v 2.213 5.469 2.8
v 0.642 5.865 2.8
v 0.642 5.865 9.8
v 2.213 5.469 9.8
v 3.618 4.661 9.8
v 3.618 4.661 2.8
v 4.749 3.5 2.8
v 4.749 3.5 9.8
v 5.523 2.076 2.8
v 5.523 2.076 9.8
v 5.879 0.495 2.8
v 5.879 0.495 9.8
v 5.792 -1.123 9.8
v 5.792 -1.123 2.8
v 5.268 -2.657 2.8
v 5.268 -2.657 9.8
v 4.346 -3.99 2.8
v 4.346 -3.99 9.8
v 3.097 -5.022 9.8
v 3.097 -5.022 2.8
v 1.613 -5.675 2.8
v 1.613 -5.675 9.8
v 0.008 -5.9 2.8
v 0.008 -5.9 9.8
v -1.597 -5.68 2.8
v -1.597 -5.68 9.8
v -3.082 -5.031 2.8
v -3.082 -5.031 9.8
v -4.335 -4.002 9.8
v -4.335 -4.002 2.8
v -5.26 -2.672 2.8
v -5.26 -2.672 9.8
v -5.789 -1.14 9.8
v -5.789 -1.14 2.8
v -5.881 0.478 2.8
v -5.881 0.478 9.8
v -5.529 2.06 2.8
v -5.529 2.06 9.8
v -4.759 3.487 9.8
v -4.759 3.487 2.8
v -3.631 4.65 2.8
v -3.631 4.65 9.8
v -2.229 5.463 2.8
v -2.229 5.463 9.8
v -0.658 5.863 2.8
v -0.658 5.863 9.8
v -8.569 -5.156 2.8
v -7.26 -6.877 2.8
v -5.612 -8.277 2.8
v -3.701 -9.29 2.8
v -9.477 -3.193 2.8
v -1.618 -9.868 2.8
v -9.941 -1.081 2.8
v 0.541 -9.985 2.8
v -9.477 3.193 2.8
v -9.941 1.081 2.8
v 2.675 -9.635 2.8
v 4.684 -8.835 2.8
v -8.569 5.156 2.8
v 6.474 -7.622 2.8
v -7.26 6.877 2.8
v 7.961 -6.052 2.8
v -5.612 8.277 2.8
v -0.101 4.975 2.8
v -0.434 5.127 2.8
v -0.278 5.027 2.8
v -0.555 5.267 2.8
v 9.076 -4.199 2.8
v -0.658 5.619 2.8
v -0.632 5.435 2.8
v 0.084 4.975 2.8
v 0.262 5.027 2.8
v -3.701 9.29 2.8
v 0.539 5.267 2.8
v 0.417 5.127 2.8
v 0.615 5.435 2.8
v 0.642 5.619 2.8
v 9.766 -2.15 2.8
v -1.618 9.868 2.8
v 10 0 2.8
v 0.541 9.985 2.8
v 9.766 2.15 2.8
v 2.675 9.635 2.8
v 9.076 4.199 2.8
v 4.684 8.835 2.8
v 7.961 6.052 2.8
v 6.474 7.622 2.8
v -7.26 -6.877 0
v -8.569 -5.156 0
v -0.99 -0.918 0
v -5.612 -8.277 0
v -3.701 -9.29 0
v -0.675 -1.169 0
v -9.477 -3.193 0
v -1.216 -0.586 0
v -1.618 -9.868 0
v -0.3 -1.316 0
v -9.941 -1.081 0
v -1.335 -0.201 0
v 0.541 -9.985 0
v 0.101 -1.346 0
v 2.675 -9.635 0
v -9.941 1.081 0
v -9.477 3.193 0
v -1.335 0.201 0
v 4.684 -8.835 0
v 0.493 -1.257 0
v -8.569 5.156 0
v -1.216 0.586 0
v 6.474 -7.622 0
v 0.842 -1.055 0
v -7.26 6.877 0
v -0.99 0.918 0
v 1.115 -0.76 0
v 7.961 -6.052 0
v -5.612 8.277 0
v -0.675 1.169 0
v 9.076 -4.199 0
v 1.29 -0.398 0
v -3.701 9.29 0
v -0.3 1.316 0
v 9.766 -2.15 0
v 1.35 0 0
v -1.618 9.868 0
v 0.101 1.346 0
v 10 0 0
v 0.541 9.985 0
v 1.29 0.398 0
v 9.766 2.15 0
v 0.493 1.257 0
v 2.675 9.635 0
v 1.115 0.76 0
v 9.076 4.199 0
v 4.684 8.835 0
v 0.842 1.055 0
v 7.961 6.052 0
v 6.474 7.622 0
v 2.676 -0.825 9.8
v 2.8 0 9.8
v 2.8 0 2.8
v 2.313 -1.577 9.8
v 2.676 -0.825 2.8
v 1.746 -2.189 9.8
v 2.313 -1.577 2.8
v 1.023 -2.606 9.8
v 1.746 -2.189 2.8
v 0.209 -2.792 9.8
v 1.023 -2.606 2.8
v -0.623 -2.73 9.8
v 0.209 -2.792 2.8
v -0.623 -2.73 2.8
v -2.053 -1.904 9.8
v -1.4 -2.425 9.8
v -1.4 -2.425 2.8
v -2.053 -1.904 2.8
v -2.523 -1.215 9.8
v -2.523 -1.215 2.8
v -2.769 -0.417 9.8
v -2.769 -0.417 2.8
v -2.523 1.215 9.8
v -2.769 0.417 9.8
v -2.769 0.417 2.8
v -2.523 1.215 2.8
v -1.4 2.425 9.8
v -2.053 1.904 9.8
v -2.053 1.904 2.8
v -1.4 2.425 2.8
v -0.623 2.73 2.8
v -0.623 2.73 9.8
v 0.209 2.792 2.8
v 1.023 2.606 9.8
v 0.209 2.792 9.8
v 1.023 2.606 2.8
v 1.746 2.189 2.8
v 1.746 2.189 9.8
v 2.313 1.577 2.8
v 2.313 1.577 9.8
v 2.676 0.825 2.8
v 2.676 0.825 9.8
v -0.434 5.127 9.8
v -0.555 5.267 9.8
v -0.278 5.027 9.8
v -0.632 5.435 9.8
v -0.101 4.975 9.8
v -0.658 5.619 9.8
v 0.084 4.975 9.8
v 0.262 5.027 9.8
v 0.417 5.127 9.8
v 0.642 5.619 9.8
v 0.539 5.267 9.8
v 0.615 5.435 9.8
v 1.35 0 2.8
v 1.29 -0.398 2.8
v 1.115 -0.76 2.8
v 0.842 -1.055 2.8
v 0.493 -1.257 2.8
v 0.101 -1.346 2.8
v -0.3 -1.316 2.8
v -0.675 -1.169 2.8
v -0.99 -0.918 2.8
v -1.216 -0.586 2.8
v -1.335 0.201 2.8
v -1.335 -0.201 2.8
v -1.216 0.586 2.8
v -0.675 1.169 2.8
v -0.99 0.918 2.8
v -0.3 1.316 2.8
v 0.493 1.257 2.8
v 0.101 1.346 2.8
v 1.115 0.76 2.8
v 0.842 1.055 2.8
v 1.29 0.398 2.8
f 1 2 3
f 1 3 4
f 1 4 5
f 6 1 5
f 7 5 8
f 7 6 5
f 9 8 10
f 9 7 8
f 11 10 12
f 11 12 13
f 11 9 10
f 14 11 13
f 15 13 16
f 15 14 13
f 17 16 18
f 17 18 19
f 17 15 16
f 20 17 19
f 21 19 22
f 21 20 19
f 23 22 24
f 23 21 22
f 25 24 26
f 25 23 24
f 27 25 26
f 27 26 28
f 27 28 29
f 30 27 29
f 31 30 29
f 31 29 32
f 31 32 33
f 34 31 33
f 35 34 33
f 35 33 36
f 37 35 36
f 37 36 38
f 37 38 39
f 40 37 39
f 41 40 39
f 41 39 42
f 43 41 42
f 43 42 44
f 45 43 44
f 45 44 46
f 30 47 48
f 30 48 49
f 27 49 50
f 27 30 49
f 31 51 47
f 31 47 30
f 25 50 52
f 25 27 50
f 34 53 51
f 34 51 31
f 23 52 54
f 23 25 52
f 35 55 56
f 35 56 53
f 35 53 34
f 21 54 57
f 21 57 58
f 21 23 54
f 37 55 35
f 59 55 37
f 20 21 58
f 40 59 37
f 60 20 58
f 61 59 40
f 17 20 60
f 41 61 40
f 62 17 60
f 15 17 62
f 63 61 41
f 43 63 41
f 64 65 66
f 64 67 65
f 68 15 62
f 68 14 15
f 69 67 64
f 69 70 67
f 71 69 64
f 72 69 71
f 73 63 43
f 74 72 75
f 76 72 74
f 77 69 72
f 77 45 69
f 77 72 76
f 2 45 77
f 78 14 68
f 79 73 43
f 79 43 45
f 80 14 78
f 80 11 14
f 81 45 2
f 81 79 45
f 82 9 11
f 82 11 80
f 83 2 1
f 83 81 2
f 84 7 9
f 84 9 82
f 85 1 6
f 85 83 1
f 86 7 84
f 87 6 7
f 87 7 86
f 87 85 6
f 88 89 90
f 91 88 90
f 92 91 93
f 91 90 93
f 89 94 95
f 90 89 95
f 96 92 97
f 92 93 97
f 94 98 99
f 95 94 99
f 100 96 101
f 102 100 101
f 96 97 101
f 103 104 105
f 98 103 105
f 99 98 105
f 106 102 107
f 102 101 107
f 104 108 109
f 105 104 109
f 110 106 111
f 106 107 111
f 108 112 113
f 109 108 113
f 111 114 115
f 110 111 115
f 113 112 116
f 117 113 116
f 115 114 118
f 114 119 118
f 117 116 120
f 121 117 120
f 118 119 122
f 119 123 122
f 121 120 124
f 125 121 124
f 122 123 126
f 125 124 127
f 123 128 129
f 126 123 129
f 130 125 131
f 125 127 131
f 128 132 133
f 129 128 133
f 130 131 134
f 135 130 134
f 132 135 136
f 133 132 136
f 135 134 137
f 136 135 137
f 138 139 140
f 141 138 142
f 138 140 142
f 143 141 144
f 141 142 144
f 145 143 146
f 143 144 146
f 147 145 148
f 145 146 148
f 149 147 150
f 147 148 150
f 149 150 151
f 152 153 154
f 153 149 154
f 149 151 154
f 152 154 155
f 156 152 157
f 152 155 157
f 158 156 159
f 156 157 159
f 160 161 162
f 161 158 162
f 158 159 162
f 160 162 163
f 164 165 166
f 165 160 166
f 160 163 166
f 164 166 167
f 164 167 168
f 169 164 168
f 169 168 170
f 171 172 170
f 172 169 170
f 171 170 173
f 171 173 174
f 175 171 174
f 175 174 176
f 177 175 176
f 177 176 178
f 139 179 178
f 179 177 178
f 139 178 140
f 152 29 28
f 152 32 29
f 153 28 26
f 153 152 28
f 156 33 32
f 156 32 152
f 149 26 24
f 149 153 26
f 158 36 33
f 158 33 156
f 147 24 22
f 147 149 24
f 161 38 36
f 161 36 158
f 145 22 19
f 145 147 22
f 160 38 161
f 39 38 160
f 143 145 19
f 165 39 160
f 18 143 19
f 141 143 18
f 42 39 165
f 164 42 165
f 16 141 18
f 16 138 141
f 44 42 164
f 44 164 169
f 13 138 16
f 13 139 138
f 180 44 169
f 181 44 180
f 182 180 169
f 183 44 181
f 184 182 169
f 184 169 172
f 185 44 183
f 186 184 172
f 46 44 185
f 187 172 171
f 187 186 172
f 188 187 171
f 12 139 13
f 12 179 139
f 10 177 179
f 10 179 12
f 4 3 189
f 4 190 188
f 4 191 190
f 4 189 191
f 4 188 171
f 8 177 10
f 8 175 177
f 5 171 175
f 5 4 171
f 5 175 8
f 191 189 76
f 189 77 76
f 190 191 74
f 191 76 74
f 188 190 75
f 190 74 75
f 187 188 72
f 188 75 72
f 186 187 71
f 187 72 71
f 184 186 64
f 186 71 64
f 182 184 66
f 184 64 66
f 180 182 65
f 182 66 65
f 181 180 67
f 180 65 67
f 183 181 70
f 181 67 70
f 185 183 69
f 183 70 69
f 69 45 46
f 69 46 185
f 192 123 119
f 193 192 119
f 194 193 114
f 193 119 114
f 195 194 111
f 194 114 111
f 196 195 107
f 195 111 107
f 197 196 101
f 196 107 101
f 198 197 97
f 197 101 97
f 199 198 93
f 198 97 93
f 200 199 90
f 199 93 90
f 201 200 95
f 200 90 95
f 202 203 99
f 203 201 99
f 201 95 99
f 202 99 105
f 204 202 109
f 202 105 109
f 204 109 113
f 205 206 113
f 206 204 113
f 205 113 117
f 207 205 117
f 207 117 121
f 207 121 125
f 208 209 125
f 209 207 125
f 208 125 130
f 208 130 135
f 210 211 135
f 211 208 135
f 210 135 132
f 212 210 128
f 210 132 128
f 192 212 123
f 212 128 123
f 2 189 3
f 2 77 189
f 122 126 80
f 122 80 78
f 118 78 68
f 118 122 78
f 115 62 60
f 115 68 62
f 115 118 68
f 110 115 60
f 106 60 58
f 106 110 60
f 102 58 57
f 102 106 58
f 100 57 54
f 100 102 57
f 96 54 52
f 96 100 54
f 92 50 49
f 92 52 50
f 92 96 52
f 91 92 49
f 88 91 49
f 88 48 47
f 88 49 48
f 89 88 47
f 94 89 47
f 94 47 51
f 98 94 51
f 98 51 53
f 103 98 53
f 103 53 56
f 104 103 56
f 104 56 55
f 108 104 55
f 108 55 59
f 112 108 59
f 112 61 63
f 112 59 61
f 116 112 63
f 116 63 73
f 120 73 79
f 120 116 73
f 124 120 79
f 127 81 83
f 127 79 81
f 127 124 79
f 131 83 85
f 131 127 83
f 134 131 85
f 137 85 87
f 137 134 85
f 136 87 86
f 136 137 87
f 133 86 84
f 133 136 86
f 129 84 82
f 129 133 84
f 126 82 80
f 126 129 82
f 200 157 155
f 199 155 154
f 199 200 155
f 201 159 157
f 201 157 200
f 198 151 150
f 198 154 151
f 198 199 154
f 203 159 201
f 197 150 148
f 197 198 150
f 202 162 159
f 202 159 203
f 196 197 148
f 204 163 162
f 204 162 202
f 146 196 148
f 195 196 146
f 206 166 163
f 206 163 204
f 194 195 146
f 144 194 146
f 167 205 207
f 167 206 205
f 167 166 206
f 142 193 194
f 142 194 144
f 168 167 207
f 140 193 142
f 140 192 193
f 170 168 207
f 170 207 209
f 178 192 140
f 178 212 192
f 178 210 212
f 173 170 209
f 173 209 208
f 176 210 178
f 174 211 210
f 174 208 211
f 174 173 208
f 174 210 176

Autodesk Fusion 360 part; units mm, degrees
sketch "Sketch1" plane through (0, 0, 0) normal (0, 0, 1) x (1, 0, 0)
  circle A0 centre (0, 0) radius 10
  circle A1 centre (0, 0) radius 5.9
  circle A2 centre (0, 0) radius 2.8
  circle A3 centre (0, 0) radius 1.35
  line L0 (-0.6583, 7.8026) -> (-0.6583, 5.6186)
  arc A4 (-0.6583, 5.6186) -> (0.6417, 5.6186) centre (-0.0083, 5.6186) ccw
  line L1 (0.6417, 5.6186) -> (0.6417, 7.8026)
  arc A5 (0.6417, 7.8026) -> (-0.6583, 7.8026) centre (-0.0083, 7.8026) ccw
  line L2 (-0.0083, 7.8026) -> (-0.0083, 5.6186) construction
  dimension "d1" = 20
  dimension "d2" = 11.8
  dimension "d3" = 5.6
  dimension "d4" = 2.7
  dimension "d10" = 1.3
extrude "Extrude1" add sketch "Sketch1" along normal blind 2.8 contours A0 | A1 L0 A4 L1 | A1 L0 A4 L1 | A1 L0 L1 A5 | A2
extrude "Extrude2" add sketch "Sketch1" along normal blind 9.8 contours A1 L0 A4 L1 picked at (-1.284, 4.3991)
